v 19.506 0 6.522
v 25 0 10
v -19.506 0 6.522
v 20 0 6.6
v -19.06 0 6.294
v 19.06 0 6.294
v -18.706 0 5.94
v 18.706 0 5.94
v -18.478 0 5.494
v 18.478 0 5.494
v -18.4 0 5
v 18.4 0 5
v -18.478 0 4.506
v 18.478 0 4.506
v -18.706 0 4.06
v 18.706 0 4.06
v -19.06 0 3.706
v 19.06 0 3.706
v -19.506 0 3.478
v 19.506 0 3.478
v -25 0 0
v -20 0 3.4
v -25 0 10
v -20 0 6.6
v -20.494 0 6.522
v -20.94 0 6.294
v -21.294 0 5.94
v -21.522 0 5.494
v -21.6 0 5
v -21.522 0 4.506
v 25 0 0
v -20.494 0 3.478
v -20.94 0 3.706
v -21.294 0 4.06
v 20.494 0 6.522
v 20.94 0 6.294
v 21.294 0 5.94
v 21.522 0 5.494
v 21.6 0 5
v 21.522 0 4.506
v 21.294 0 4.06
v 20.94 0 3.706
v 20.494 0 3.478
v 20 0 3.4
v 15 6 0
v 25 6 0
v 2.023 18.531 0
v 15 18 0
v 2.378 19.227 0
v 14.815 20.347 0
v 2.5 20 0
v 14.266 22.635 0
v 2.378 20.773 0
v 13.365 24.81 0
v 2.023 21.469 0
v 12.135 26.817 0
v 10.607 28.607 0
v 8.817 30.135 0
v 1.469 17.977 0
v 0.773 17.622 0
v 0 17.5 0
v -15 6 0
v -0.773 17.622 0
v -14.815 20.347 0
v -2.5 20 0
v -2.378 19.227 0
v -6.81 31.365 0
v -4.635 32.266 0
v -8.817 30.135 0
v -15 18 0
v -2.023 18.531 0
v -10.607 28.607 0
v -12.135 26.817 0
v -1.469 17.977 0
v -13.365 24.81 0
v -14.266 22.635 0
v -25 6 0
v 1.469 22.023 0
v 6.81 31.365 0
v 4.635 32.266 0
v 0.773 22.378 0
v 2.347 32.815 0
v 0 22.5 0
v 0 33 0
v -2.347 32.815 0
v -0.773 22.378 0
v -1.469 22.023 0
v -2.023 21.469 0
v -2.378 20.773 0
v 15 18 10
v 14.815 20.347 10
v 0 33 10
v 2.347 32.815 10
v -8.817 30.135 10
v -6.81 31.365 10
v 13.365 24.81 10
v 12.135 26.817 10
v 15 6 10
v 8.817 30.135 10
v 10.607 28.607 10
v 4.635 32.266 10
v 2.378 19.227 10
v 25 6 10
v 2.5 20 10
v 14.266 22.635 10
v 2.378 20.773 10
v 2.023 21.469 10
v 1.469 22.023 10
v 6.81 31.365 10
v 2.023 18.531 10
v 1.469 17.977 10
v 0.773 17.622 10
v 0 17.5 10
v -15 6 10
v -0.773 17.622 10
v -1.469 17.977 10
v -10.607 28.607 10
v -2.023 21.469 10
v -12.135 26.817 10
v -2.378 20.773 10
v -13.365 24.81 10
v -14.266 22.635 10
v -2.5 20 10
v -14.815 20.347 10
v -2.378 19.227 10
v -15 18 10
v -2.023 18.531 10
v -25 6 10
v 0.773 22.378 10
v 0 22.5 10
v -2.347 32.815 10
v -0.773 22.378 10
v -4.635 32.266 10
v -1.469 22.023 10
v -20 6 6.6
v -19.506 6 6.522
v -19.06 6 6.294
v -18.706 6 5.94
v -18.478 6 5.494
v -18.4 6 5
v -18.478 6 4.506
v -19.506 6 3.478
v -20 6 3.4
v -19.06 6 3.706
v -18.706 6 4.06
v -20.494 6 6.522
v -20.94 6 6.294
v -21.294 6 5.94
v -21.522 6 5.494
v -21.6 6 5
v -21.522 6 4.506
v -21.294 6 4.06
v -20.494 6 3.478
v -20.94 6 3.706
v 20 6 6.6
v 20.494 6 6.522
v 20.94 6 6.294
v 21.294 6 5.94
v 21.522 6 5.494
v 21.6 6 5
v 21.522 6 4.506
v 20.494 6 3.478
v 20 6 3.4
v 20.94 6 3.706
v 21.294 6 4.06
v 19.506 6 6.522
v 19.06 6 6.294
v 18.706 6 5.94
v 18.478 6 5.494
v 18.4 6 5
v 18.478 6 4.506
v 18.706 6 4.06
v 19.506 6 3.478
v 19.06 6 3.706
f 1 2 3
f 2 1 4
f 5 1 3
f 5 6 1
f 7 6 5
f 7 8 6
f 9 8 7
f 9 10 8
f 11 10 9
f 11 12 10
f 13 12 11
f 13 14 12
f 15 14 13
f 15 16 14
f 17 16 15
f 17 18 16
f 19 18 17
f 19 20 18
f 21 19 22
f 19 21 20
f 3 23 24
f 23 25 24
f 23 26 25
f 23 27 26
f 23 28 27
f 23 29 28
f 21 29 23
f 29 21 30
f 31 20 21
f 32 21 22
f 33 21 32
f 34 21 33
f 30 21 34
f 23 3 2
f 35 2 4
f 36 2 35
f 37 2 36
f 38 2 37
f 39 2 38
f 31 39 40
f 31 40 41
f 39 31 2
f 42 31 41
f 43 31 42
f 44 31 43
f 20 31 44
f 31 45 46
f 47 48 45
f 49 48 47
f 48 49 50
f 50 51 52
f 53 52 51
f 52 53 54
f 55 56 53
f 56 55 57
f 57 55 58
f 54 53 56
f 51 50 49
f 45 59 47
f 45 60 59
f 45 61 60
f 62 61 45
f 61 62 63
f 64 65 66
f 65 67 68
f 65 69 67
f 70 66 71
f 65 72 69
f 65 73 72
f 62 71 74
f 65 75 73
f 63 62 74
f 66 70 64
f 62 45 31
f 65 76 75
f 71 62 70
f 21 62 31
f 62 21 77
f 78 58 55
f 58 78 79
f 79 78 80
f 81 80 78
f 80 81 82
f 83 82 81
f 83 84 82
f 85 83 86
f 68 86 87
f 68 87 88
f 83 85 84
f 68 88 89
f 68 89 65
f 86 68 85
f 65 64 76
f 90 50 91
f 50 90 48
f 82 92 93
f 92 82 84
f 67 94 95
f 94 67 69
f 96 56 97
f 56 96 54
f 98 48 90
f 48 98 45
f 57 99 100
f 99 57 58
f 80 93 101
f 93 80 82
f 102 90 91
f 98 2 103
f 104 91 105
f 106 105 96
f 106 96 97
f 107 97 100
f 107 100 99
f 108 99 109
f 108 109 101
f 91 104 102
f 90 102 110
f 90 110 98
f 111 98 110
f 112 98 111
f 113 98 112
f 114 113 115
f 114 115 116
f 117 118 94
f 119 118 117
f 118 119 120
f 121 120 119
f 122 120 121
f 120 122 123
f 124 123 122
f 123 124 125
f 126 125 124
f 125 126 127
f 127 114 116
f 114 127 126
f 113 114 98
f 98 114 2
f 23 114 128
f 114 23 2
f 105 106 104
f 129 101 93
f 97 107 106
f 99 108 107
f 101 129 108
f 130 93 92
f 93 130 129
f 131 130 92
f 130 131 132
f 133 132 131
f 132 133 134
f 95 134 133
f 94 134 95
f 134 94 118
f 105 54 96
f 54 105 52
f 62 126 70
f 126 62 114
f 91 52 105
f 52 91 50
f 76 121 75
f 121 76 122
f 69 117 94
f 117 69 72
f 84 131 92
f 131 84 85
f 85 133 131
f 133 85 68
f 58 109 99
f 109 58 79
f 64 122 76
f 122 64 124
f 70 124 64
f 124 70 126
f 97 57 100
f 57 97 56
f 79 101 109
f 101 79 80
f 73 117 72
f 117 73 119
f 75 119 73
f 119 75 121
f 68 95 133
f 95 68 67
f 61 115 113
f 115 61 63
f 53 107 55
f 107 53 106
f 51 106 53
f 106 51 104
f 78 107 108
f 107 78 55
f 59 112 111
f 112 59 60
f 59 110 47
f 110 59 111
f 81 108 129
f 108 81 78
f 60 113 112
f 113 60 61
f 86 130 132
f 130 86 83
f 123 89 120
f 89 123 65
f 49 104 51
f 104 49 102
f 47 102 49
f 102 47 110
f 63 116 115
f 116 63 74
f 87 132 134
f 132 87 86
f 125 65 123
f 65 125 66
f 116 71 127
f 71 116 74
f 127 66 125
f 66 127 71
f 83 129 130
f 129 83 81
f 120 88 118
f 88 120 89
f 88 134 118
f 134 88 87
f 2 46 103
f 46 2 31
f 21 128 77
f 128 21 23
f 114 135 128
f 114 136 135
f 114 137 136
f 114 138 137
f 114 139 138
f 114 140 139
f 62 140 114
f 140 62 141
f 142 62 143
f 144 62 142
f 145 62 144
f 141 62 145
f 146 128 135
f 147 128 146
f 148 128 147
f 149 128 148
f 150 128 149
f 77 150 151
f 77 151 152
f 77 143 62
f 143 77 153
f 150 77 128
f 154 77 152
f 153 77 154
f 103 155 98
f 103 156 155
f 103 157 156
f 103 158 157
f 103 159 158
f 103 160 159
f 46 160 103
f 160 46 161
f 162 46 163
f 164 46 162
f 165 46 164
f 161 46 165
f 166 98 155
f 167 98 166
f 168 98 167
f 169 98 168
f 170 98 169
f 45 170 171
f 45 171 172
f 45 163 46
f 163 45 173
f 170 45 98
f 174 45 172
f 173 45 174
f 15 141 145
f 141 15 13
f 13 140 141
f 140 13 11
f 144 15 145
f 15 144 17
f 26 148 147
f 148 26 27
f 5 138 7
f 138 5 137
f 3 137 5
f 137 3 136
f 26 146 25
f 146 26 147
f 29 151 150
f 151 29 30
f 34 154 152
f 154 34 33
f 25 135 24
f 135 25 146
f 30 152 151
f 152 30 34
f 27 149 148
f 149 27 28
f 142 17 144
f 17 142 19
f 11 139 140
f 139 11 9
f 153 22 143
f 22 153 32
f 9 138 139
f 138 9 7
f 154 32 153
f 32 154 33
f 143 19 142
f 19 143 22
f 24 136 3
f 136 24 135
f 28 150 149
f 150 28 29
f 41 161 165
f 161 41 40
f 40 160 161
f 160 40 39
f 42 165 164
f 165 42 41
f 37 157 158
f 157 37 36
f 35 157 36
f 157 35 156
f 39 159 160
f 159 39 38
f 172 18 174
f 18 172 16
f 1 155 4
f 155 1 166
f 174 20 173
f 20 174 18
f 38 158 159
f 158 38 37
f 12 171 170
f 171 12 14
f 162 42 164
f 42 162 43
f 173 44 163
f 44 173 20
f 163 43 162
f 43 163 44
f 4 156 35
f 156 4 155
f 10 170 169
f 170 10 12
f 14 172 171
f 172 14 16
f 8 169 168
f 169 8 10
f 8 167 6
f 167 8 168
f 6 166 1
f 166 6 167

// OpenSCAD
difference(){
hull(){
linear_extrude(10)
polygon([[-15,0],[0,10],[15,0]]);
translate([0,18,0])cylinder(d=30,h=10,$fn=40);
}
translate([0,20,0])cylinder(d=5,h=10,$fn=20);
//translate([10,0,5])rotate([90,0,0])
//cylinder(d=3,h=60,$fn=20,center=true);
//translate([10,15,5])rotate([-90,0,0])
//cylinder(d=6,h=20,$fn=20);
//translate([-10,0,5])rotate([90,0,0])
//cylinder(d=3,h=60,$fn=20,center=true);
//translate([-10,15,5])rotate([-90,0,0])
//cylinder(d=6,h=20,$fn=20);
}

difference(){
translate([-25,0,0])cube([50,6,10]);
translate([-20,0,5])rotate([-90,0,0])
    cylinder(d=3.2,h=10,$fn=20);
translate([20,0,5])rotate([-90,0,0])
    cylinder(d=3.2,h=10,$fn=20);
}
